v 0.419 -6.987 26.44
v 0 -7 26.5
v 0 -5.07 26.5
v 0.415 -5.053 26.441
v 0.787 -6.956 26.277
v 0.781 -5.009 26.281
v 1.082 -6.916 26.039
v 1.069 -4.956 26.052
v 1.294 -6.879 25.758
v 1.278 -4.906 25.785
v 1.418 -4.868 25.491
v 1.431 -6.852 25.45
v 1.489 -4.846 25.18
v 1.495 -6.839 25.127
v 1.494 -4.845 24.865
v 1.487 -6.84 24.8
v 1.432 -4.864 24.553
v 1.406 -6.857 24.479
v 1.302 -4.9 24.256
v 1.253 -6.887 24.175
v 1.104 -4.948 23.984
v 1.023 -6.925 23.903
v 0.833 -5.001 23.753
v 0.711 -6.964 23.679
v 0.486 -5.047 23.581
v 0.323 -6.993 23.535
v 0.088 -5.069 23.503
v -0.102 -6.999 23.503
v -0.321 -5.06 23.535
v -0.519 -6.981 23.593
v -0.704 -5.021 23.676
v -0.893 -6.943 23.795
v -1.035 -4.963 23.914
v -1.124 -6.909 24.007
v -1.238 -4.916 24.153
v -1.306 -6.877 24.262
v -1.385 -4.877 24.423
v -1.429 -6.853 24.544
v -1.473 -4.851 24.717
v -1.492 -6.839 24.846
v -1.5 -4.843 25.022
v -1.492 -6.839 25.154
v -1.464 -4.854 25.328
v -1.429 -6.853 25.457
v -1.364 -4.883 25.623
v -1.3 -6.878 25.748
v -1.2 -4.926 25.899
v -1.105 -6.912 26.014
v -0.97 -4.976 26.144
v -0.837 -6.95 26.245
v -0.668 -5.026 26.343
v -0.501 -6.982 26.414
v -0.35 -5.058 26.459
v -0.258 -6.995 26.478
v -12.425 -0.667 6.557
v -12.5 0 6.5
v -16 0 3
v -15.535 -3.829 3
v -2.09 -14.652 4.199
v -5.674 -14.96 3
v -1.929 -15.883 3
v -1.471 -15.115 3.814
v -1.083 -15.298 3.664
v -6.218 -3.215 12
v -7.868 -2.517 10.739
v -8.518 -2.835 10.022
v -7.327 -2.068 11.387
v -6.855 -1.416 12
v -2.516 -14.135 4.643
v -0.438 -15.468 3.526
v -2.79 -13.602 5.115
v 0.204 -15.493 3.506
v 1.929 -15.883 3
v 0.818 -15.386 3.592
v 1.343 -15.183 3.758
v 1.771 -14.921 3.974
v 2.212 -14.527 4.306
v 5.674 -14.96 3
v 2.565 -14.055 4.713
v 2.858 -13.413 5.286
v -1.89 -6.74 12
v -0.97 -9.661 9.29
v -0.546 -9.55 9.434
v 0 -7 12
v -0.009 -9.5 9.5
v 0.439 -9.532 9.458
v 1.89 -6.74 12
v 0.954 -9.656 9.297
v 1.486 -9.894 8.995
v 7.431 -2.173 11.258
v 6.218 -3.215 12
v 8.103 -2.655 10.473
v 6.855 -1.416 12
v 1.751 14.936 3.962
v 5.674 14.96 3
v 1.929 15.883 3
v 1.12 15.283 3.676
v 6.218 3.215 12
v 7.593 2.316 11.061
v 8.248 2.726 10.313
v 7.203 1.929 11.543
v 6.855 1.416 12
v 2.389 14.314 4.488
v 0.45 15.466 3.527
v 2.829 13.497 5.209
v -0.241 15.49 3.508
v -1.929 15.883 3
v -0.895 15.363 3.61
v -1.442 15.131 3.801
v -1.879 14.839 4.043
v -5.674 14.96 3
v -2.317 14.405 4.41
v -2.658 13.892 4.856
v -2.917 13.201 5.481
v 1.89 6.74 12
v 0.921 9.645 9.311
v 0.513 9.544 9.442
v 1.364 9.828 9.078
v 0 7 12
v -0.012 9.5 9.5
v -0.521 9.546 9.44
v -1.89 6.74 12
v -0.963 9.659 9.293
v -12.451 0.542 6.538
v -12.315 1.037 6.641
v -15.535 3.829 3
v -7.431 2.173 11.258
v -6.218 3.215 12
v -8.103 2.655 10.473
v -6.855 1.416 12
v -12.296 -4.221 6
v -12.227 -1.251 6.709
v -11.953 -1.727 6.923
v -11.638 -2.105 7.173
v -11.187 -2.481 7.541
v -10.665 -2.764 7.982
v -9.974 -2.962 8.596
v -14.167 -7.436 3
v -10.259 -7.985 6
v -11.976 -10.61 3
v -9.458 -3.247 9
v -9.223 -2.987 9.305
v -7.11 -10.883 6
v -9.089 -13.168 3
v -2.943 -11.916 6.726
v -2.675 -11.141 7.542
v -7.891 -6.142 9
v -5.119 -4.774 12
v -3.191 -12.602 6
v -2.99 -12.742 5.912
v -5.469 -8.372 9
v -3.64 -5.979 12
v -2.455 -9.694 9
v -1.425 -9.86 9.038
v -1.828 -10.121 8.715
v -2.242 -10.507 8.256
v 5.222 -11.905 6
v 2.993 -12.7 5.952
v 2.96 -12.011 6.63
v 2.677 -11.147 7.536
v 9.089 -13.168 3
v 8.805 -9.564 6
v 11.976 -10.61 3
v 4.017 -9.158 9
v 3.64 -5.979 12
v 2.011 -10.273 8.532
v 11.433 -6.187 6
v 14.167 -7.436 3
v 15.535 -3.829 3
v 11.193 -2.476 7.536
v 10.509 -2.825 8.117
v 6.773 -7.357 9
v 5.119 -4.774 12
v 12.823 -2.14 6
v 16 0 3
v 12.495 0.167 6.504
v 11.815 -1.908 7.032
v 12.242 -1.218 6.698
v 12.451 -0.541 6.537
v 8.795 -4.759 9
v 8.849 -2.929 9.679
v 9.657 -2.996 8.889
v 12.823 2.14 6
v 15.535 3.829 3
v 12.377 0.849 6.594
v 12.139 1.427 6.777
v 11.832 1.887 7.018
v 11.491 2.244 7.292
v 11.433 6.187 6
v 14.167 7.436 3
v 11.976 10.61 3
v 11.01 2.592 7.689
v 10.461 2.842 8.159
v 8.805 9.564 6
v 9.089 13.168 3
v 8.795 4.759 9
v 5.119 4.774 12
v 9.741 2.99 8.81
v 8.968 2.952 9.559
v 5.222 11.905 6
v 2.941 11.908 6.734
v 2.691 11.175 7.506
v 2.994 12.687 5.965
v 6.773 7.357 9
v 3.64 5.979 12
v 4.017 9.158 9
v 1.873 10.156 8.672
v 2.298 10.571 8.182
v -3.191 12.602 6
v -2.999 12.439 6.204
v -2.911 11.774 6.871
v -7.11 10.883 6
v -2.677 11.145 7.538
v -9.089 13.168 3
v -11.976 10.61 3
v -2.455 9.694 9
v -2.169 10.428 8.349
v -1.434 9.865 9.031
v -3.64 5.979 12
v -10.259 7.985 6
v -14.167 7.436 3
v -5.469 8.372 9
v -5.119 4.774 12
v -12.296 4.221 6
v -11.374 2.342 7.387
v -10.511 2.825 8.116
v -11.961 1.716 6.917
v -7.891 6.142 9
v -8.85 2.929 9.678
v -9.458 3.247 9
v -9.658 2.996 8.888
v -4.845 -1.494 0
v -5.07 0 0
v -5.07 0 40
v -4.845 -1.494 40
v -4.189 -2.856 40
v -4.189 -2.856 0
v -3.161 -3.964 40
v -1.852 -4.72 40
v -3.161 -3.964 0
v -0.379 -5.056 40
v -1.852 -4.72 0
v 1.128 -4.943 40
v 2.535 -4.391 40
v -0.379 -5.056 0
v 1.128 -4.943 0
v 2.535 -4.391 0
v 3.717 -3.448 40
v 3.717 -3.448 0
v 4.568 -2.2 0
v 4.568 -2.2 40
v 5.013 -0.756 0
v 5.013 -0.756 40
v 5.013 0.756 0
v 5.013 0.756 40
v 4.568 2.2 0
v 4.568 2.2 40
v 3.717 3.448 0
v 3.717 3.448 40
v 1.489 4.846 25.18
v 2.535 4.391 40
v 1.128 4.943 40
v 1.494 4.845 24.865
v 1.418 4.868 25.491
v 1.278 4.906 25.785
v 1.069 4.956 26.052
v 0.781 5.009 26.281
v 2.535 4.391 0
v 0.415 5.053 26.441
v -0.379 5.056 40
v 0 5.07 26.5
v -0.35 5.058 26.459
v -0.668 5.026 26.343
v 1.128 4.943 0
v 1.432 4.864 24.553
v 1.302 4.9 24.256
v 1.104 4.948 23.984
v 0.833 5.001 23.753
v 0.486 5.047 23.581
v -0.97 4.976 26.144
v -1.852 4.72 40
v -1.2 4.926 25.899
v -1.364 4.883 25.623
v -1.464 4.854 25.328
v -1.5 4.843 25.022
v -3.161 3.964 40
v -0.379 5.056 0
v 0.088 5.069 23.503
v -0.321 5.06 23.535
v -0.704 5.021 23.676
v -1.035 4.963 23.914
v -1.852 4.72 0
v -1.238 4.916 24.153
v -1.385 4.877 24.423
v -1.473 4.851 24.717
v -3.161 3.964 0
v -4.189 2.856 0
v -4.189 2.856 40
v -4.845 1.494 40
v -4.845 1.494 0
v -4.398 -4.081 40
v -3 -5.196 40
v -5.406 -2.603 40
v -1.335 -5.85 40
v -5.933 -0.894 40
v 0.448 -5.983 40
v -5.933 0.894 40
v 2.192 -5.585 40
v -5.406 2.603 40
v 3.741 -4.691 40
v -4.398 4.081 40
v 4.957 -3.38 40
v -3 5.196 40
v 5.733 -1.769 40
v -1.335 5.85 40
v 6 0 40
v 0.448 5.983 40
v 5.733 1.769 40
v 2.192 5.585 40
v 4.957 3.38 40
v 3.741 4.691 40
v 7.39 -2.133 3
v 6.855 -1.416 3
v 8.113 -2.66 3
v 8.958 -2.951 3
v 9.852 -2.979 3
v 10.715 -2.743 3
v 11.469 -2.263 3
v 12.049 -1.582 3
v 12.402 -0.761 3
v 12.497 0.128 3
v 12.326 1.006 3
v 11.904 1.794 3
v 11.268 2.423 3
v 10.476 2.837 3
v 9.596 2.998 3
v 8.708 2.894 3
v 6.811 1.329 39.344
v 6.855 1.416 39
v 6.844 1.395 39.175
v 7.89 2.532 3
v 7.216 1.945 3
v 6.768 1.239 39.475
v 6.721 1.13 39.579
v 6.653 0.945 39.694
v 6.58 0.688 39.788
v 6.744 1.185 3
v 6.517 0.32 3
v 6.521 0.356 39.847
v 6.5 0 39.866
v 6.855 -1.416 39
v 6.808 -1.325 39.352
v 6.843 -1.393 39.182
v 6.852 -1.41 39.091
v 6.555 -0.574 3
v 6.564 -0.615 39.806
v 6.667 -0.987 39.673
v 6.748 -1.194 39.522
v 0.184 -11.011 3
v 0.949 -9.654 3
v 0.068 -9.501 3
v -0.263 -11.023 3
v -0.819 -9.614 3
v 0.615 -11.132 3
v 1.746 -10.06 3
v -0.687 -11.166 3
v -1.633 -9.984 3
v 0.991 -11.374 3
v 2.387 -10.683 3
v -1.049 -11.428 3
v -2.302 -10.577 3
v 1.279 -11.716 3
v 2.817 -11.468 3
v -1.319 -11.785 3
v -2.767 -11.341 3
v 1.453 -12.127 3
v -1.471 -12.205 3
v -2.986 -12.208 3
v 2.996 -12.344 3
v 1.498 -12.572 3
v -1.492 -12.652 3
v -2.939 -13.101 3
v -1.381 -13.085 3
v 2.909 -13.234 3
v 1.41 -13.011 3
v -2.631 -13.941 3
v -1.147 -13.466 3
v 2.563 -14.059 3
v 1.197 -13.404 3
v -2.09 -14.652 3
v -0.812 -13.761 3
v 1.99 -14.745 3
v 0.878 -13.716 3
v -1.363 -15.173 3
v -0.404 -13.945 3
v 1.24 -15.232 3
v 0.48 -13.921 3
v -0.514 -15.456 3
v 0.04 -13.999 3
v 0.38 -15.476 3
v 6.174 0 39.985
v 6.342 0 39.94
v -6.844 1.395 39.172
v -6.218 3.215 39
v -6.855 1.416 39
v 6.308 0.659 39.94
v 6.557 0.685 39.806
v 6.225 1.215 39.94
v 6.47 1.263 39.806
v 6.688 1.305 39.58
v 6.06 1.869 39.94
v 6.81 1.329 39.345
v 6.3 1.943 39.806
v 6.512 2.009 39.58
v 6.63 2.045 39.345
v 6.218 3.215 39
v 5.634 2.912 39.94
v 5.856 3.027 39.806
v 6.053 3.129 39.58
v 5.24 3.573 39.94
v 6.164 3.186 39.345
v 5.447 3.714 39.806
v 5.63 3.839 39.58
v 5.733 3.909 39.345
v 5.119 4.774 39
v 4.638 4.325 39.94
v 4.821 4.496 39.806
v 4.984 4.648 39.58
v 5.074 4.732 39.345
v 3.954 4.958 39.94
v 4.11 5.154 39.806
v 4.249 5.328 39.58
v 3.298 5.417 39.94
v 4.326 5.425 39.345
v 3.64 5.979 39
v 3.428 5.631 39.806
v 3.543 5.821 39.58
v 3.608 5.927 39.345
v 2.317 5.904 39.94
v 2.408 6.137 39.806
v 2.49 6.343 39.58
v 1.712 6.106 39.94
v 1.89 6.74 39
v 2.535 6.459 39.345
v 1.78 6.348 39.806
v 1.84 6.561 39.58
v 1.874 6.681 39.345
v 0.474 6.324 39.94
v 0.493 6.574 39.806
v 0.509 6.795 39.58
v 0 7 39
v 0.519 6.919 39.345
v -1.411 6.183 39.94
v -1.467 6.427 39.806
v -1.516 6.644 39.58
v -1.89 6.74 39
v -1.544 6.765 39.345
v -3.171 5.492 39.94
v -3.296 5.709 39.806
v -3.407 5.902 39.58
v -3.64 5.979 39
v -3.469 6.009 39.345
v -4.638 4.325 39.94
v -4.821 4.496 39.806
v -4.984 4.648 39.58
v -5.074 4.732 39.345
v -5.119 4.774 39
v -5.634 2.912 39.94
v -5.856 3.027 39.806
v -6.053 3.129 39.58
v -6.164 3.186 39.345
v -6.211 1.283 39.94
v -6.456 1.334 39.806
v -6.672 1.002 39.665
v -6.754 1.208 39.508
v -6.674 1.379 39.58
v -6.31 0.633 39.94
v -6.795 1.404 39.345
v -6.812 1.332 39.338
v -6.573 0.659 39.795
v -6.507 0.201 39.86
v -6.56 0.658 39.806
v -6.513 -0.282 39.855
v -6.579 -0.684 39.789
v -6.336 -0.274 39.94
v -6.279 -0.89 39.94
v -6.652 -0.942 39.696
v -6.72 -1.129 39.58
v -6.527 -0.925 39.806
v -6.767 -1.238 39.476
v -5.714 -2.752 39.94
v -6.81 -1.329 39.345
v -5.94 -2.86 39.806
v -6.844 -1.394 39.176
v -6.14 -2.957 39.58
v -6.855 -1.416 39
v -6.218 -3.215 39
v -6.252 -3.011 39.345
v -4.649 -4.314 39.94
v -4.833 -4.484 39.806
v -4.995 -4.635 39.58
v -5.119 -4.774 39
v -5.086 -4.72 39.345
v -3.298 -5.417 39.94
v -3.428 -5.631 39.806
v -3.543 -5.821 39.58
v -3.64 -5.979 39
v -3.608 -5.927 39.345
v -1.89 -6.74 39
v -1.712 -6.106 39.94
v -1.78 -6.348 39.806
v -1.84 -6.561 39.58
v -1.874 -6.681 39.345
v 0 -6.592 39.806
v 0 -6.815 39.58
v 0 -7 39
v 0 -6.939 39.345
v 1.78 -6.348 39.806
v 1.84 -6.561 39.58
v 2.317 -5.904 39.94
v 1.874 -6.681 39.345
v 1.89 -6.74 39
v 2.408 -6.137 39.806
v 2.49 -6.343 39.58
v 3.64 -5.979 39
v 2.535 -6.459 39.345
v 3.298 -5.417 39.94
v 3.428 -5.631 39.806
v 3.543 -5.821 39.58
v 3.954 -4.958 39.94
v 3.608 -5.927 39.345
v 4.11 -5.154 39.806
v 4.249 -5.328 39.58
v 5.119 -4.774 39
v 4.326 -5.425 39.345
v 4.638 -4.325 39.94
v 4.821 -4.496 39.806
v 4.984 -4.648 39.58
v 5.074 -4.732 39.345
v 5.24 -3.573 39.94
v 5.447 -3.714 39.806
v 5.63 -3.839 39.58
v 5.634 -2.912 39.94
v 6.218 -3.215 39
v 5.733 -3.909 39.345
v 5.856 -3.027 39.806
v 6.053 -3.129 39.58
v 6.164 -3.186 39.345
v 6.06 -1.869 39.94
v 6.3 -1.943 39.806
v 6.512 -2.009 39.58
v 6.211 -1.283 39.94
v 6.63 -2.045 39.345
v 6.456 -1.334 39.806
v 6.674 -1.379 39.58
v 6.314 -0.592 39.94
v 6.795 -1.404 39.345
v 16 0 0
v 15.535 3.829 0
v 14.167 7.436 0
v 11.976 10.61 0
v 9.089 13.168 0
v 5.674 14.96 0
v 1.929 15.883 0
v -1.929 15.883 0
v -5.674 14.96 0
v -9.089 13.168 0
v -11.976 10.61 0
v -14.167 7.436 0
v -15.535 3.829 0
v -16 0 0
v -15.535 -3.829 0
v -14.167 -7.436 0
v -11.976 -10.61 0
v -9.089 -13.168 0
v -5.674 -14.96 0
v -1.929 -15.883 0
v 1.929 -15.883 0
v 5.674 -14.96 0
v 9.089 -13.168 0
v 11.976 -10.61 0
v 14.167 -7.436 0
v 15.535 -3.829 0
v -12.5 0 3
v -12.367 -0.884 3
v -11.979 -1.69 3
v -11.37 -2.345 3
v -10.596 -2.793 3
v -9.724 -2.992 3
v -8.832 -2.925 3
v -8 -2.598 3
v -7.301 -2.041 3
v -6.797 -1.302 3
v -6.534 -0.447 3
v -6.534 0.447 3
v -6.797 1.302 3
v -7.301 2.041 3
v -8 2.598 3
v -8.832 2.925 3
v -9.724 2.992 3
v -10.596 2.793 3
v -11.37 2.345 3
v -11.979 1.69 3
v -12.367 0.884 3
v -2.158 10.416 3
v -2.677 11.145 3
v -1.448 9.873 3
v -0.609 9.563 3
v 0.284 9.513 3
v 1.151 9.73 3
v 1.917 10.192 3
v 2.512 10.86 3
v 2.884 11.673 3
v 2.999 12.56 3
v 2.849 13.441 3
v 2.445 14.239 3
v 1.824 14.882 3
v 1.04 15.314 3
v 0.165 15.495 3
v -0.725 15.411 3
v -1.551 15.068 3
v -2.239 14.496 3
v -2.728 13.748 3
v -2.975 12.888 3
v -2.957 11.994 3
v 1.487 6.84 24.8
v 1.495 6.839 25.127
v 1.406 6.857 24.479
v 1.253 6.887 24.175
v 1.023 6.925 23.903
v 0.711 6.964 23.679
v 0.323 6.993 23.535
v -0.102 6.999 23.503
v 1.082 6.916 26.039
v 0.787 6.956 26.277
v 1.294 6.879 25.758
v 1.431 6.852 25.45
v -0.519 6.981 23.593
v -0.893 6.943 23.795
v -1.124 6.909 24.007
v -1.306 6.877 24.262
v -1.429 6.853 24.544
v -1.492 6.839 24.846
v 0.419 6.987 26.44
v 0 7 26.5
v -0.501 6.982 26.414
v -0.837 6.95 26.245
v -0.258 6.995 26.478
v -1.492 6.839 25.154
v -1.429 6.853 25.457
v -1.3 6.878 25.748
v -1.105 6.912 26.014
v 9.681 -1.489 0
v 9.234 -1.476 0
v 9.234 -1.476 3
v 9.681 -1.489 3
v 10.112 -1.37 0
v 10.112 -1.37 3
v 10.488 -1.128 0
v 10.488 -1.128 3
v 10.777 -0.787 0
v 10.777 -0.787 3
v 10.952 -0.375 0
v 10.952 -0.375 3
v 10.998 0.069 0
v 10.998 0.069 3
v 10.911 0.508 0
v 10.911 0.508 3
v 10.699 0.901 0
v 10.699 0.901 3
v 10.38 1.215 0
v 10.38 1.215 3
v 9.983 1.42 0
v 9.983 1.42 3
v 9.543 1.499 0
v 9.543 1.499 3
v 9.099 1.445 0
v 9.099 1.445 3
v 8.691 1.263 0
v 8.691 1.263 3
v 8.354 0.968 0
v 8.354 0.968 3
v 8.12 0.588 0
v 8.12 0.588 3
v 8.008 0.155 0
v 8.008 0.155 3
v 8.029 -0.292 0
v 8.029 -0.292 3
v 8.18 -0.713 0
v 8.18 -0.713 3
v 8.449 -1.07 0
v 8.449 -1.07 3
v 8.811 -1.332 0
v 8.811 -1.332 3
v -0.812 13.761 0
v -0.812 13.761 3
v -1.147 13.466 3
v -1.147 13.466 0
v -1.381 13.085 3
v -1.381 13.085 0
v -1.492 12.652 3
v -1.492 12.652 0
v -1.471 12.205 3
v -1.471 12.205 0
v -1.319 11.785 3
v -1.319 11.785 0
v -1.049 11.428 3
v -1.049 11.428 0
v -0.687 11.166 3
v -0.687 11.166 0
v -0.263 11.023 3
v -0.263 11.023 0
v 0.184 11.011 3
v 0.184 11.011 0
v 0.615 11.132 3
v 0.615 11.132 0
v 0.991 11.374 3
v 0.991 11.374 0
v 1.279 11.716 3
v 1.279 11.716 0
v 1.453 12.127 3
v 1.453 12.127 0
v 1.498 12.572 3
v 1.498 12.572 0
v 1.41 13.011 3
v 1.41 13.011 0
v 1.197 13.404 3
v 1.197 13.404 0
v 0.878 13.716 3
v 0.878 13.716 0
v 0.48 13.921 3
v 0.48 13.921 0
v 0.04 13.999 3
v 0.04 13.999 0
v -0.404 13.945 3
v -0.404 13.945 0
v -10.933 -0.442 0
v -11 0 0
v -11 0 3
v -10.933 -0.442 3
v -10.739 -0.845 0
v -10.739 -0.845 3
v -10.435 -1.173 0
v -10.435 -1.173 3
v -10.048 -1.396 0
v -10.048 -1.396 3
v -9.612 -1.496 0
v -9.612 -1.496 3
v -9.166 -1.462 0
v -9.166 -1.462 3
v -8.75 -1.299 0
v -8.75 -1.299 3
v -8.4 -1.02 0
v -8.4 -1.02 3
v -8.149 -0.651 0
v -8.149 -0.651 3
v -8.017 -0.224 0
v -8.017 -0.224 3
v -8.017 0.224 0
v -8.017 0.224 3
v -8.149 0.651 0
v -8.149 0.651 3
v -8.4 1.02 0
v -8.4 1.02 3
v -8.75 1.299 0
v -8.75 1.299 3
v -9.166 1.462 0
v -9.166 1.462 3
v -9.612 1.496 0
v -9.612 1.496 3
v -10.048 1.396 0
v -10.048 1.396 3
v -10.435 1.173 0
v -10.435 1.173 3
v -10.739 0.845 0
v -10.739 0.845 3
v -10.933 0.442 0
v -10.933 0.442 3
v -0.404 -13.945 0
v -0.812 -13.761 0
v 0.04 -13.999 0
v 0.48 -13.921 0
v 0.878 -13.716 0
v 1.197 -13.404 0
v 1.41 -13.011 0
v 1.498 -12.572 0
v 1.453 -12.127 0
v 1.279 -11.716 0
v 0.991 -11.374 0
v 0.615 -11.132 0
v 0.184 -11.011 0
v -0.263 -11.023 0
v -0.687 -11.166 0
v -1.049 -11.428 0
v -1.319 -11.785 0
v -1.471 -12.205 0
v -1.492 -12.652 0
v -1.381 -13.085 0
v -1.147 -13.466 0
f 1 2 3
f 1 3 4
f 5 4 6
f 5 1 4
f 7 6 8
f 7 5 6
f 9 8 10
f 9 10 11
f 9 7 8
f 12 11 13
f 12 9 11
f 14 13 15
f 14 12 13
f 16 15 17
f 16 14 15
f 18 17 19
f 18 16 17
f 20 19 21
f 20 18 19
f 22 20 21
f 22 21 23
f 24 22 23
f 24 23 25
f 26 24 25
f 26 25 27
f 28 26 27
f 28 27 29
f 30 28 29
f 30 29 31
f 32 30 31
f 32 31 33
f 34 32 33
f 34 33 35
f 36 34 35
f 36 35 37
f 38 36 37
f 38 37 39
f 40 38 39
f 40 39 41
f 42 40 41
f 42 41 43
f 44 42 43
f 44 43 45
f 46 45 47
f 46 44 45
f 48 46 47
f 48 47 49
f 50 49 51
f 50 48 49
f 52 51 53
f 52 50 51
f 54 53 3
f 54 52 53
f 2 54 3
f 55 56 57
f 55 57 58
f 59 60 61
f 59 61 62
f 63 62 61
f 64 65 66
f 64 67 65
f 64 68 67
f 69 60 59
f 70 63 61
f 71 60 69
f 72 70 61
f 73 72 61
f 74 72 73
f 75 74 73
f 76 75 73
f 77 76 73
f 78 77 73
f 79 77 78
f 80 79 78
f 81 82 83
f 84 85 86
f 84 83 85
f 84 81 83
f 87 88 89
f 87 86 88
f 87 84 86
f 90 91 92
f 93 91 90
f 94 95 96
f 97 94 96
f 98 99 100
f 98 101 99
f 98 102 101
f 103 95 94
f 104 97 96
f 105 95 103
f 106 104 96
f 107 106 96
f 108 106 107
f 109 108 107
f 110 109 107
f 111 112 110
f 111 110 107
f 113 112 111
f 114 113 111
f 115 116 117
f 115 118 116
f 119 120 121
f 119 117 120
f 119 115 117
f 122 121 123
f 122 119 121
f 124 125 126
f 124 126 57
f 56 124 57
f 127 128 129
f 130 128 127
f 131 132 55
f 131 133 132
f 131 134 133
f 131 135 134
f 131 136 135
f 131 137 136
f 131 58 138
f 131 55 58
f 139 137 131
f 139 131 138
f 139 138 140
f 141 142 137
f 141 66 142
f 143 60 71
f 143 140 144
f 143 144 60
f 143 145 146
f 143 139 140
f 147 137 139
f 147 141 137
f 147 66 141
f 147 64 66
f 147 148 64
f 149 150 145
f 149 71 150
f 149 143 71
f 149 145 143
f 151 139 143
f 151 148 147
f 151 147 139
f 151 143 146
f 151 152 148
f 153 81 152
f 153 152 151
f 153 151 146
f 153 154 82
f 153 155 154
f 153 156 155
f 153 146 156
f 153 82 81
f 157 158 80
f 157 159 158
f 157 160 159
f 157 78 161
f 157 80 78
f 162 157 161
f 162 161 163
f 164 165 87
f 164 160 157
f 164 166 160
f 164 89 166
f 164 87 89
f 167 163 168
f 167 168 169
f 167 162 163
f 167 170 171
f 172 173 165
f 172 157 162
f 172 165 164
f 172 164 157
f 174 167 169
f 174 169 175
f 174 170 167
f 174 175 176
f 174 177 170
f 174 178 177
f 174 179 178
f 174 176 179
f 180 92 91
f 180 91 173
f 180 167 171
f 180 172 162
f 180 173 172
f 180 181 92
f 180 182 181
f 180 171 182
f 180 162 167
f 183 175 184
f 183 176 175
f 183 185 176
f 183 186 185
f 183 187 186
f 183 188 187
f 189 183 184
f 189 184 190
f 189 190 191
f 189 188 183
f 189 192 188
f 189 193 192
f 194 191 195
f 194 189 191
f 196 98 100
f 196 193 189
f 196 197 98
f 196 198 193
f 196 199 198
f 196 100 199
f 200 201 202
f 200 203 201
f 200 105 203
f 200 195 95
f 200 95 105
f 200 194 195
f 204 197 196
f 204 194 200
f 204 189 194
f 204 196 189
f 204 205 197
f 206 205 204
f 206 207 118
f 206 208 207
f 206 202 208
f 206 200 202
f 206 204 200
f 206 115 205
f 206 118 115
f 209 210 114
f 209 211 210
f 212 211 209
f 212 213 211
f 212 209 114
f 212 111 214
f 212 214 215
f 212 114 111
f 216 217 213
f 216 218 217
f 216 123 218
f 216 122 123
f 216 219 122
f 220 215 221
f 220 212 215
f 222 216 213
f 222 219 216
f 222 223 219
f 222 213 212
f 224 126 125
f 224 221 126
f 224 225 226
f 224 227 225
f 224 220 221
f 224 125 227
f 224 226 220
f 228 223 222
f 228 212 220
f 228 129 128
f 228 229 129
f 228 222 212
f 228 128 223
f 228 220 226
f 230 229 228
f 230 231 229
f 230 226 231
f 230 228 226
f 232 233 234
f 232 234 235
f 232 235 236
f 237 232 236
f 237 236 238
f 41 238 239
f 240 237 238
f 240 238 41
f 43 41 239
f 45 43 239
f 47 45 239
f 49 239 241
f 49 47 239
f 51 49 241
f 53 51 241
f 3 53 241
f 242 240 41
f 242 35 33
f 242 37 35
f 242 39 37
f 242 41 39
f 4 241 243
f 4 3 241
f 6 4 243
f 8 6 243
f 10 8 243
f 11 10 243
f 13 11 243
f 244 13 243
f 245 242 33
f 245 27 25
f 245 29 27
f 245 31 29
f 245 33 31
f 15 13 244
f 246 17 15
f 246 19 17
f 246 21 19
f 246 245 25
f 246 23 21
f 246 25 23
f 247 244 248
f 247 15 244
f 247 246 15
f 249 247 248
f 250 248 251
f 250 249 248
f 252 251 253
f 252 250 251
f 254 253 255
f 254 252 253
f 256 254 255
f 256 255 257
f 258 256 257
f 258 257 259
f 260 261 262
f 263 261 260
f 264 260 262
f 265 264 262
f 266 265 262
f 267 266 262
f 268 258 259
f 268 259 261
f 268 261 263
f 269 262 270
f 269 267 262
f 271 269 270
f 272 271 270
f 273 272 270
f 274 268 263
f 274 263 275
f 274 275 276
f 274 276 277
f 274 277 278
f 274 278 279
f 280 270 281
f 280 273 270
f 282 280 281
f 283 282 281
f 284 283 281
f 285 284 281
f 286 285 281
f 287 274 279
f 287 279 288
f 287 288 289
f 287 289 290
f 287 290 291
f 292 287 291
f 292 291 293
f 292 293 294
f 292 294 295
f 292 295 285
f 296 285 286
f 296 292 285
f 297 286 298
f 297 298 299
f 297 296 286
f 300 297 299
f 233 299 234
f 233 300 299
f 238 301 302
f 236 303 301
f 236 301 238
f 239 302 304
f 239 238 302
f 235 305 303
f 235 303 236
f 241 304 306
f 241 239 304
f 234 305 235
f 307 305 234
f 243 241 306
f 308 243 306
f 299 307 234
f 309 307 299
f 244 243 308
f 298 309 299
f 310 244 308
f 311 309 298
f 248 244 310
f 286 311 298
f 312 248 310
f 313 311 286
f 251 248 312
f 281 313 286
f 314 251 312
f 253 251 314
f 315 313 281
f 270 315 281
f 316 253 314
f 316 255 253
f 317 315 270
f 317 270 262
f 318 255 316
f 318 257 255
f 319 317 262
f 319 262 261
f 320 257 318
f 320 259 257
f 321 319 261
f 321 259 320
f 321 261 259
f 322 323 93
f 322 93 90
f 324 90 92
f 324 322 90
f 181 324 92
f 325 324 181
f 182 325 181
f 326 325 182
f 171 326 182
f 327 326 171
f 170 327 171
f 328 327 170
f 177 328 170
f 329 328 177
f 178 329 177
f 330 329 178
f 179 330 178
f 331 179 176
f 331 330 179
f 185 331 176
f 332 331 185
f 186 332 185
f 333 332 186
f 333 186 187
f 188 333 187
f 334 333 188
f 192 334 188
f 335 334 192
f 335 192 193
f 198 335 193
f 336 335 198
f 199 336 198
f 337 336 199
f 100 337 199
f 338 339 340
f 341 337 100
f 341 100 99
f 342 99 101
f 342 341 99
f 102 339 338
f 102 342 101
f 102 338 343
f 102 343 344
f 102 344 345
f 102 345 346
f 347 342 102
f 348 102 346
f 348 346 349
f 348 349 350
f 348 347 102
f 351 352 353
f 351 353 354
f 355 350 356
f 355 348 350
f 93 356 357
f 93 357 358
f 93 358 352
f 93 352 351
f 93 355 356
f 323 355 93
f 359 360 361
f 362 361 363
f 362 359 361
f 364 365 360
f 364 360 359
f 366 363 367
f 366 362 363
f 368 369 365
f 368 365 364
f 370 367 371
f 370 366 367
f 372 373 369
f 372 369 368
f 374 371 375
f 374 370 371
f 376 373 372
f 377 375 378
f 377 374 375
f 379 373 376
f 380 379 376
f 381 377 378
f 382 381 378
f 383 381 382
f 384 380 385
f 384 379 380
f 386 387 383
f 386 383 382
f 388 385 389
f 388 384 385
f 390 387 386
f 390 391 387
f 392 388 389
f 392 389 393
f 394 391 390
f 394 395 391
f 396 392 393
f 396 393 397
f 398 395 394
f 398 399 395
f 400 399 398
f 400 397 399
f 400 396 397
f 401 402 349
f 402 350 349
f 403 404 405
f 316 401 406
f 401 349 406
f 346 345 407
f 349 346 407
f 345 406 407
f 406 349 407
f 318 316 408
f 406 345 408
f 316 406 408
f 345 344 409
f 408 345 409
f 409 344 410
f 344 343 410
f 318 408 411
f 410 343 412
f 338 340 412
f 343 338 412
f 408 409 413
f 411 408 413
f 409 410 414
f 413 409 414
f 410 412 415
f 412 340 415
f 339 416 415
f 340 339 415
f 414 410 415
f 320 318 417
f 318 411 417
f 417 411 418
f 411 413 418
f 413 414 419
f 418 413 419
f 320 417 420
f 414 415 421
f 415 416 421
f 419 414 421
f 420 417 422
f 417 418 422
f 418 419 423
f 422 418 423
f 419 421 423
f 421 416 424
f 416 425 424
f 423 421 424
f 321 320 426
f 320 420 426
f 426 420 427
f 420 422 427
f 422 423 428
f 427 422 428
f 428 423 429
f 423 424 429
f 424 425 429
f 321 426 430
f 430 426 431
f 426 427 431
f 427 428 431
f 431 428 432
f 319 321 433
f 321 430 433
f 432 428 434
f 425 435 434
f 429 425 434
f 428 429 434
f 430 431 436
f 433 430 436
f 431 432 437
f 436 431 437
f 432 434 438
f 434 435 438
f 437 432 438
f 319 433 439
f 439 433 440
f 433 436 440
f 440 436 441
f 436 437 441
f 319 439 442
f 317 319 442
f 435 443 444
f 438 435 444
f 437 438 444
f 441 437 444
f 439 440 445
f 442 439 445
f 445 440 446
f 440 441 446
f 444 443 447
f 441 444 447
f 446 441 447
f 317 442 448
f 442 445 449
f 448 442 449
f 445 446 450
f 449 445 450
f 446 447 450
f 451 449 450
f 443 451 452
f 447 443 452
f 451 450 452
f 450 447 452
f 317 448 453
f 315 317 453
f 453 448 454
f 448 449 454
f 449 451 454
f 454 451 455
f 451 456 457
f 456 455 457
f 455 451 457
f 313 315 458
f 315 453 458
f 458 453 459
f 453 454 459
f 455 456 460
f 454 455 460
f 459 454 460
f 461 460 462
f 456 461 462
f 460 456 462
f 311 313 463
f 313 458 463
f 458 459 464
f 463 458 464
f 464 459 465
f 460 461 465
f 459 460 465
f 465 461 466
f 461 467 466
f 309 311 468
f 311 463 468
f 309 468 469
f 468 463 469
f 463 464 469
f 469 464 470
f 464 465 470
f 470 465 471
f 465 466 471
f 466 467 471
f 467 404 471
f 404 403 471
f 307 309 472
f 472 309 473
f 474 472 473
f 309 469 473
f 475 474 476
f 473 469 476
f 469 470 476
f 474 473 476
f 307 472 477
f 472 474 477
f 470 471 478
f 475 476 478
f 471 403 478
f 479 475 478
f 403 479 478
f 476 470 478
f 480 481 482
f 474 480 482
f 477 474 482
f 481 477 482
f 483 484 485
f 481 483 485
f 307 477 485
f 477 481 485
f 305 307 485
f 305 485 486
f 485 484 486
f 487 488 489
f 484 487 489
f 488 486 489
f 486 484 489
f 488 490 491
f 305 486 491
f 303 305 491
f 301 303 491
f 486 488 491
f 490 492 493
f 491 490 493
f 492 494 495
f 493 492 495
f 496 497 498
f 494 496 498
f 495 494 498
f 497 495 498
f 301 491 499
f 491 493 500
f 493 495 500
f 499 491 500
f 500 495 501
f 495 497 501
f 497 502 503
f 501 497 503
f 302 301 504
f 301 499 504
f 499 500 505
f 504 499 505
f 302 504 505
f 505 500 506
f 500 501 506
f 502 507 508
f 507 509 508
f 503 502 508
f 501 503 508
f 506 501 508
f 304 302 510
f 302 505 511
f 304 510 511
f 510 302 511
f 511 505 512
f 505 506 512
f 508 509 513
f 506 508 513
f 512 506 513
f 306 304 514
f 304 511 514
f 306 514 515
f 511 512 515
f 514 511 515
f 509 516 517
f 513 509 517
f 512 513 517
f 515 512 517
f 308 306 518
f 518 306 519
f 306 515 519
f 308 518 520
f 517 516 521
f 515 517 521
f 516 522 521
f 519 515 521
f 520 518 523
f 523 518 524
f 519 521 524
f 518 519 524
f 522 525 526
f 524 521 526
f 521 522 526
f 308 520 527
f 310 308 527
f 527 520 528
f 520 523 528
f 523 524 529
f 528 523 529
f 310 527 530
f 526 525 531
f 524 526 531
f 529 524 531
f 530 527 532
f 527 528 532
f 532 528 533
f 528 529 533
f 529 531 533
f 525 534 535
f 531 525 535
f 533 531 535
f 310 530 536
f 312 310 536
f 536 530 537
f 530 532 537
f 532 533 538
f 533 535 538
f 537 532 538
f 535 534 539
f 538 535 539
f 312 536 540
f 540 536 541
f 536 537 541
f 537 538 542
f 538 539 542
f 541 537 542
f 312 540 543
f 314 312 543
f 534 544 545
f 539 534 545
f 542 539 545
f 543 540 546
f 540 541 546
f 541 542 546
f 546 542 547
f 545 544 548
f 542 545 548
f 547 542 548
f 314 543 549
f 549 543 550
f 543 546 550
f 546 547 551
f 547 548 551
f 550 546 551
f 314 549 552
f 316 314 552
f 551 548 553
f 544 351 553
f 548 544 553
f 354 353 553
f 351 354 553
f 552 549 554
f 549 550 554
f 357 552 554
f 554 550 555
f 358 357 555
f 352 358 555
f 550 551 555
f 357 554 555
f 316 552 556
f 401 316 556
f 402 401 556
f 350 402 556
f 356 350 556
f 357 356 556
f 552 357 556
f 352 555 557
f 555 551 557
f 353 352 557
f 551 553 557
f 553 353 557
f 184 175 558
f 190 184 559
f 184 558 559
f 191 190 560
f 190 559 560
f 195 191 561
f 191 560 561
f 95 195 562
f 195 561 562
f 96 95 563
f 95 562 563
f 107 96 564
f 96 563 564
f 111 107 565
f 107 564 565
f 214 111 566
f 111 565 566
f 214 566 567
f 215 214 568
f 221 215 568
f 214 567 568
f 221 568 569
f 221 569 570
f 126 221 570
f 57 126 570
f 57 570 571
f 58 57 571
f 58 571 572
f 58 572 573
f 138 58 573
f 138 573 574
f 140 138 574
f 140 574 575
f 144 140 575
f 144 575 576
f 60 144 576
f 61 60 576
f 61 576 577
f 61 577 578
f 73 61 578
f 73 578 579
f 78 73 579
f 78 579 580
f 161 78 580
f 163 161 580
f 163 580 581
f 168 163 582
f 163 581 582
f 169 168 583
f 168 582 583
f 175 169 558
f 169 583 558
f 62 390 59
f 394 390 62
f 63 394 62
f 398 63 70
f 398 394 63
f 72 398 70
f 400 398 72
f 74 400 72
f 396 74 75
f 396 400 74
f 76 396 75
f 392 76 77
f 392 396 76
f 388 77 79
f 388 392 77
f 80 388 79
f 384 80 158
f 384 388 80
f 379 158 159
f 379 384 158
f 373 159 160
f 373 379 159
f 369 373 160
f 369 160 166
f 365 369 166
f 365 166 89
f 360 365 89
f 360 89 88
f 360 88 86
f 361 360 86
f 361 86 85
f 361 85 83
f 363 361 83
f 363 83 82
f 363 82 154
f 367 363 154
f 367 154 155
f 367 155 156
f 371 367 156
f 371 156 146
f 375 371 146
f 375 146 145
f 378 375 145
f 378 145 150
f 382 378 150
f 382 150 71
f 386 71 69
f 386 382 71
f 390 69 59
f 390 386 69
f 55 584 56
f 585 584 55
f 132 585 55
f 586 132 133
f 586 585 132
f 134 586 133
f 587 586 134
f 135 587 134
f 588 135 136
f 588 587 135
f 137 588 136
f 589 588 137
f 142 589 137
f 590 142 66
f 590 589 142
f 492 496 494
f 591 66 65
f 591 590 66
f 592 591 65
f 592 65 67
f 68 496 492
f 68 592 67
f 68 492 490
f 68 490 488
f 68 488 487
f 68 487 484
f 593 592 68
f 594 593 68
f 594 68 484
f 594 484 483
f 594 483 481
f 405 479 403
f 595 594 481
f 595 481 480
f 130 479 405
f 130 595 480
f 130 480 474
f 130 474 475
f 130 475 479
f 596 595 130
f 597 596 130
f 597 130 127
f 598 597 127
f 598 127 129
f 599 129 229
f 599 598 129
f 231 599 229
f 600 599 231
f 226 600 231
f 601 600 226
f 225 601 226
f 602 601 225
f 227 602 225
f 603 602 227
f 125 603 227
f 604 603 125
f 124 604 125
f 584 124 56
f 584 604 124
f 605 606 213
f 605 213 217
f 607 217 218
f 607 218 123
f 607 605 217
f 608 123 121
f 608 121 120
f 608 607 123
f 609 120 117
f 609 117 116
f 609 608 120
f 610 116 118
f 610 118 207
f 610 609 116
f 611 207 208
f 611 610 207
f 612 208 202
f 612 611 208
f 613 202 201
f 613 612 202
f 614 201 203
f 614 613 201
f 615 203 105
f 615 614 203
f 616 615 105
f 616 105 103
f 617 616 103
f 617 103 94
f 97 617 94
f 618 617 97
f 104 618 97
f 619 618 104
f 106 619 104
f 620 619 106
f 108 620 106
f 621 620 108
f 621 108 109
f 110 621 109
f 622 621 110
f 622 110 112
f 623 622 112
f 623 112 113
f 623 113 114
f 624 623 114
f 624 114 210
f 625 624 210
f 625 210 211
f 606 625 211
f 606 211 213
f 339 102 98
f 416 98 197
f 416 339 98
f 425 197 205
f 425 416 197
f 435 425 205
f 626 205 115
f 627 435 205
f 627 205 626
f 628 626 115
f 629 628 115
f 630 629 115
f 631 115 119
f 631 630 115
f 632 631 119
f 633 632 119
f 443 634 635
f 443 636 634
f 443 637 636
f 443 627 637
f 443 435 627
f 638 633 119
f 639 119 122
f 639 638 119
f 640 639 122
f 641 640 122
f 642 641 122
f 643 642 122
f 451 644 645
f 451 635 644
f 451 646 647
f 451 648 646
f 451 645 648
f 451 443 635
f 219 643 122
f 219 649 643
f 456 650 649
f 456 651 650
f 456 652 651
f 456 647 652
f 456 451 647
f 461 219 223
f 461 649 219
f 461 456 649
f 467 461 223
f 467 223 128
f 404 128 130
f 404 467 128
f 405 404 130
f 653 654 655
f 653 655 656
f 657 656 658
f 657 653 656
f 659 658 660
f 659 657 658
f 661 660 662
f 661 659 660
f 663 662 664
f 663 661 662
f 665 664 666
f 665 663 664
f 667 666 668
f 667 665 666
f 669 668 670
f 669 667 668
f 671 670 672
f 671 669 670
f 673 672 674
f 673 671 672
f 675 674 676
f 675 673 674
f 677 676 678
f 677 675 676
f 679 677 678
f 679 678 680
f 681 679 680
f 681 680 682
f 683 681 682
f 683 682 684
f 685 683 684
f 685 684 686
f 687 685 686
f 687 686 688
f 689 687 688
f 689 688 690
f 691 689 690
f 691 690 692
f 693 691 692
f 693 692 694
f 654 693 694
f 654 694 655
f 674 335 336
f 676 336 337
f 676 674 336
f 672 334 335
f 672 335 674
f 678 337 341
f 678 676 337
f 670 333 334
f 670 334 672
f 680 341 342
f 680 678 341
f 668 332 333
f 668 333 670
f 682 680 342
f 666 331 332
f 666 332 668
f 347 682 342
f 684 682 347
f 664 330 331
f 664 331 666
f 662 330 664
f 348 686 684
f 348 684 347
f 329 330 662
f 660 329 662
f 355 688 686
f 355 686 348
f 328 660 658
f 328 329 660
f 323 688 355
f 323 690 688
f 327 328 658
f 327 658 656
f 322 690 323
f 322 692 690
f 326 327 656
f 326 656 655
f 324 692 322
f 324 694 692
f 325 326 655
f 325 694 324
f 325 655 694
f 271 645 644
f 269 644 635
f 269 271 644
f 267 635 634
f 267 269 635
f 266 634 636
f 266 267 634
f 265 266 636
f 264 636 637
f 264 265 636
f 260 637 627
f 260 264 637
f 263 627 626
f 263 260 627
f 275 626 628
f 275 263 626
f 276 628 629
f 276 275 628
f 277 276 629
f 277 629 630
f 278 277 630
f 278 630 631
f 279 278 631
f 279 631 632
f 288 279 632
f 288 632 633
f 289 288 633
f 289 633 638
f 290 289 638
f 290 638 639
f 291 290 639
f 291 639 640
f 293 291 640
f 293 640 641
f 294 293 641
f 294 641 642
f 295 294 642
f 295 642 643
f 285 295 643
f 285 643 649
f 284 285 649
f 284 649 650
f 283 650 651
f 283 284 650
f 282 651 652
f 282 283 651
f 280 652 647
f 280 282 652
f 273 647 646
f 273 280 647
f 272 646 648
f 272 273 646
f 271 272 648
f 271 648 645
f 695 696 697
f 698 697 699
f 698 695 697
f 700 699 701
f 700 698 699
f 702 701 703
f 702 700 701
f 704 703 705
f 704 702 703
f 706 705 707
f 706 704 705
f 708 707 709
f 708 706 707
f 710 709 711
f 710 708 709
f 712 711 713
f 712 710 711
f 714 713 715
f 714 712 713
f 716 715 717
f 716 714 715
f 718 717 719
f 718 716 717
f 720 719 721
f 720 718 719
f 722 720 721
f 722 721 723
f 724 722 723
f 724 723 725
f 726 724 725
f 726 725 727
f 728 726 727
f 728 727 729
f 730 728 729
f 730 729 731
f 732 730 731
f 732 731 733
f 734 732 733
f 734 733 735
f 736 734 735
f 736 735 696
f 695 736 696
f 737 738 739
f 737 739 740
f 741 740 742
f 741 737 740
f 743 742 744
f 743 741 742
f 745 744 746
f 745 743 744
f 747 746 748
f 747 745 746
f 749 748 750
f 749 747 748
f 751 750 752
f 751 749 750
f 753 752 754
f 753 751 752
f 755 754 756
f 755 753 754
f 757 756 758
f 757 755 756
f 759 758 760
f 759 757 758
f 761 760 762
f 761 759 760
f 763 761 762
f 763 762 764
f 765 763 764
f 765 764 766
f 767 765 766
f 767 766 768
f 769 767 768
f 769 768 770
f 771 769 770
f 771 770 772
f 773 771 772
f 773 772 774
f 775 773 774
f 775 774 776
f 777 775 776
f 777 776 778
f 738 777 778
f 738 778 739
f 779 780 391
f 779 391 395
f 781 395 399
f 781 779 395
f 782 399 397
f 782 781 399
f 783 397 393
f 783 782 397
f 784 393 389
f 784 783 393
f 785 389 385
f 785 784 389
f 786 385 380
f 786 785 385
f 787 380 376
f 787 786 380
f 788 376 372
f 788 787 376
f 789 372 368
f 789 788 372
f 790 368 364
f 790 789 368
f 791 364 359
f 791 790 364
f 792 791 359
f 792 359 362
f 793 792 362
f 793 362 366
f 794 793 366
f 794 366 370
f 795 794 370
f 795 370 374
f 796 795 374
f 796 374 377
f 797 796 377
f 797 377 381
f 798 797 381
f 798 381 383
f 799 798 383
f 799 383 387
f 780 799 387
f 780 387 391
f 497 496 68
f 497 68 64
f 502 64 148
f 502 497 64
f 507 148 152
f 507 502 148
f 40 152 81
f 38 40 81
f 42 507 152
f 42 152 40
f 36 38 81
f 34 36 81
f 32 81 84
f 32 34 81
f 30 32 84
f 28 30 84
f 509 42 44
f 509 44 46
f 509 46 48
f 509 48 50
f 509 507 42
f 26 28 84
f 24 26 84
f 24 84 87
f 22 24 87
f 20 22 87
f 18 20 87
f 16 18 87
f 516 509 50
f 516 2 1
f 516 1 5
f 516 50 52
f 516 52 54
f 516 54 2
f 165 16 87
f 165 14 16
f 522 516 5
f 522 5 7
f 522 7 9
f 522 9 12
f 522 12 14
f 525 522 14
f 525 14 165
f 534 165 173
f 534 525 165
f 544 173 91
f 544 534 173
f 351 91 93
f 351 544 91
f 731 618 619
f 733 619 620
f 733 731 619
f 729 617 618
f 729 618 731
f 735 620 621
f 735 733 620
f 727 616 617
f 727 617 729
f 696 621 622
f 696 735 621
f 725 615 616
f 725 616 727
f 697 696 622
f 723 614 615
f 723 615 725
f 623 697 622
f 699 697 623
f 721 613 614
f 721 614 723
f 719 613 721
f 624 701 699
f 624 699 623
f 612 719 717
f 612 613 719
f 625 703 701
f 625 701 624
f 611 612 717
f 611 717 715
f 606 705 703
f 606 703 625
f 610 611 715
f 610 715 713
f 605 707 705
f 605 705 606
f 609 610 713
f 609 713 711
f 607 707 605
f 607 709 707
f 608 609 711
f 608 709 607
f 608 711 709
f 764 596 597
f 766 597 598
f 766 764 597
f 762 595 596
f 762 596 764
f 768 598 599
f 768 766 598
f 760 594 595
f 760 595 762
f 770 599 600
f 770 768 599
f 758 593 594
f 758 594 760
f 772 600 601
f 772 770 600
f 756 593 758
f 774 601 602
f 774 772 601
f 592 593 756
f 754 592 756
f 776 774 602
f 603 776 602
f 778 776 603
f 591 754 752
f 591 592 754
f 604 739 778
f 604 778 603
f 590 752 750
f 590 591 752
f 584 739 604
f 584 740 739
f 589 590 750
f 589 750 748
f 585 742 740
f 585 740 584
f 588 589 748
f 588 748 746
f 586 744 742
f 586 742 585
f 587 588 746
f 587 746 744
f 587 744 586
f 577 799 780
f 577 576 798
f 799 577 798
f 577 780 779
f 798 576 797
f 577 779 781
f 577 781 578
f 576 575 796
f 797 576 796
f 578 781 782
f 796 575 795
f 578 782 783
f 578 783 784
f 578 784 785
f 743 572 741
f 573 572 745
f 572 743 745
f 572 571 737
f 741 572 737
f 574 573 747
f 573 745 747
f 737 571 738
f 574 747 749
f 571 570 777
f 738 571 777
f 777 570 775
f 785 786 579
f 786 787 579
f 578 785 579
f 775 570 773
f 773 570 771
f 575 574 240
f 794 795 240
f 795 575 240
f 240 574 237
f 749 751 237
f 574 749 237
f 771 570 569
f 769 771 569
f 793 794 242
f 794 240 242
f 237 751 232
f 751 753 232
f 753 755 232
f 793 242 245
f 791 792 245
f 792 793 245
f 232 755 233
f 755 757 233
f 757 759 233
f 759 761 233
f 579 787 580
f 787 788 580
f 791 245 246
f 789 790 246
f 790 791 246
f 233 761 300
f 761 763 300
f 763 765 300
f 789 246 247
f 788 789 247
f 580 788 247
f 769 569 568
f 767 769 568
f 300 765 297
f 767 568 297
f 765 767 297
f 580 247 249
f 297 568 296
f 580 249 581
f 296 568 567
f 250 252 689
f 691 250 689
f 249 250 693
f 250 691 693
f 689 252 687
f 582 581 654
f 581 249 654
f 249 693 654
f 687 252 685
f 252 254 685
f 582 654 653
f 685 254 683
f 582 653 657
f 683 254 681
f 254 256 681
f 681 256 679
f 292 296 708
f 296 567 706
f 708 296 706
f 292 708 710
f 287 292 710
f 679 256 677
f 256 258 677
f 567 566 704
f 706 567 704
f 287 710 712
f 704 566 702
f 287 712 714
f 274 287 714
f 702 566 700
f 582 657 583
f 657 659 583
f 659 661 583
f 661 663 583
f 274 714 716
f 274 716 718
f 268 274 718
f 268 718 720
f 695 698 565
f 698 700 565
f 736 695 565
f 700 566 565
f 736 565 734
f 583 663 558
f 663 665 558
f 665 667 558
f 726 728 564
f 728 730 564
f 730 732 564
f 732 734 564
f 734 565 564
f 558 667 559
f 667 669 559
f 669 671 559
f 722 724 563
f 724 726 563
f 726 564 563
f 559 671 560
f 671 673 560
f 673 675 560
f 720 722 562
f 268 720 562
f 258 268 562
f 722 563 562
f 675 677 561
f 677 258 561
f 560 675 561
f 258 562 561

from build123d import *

# Parameters (mm, degrees)
SKETCH_1_R               = 16
EXTRUDE_1_DEPTH          = 40
SKETCH_2_W               = 5.07
SKETCH_2_H               = 40
SKETCH_3_R               = 1.5
CUT_EXTRUDE_2_DEPTH      = 46.956501172
SKETCH_4_R               = 3
SKETCH_4_R_2             = 1.5
CUT_EXTRUDE_3_DEPTH      = 44.370496958
CUT_EXTRUDE_4_DEPTH      = 46.956501329
CUT_EXTRUDE_4_DEPTH_BACK = 46.956501329
SKETCH_5_R               = 1.5


with BuildPart() as part:
    # 草图1 → 凸台-拉伸1 (new body)
    with BuildSketch(Plane.XY):
        Circle(SKETCH_1_R)
    extrude(amount=EXTRUDE_1_DEPTH)

    # 草图2 → 切除-旋转1 (revolve, cut)
    with BuildSketch(Plane(origin=(0, 0, 0), x_dir=(1, 0, 0), z_dir=(0, 1, 0))):
        Polygon((-16, -40), (-16, -3), (-7, -12), (-7, -40), align=None)
        with Locations((-2.535, -20)):
            Rectangle(SKETCH_2_W, SKETCH_2_H)
    revolve(axis=Axis((0, 0, 0), (0, 0, 1)), mode=Mode.SUBTRACT)

    # 草图3 → 切除-拉伸2 (cut, through all)
    with BuildSketch(Plane.XY):
        with Locations(Location((0, -12.5, 0), (0, 0, 237.240983175))):
            Circle(SKETCH_3_R)
        with Locations(Location((-9.5, 0, 0), (0, 0, 179.999999805))):
            Circle(SKETCH_3_R)
        with Locations(Location((9.5, 0, 0), (0, 0, 259.790179824))):
            Circle(SKETCH_3_R)
        with Locations(Location((0, 12.5, 0), (0, 0, 122.759016825))):
            Circle(SKETCH_3_R)
    extrude(amount=CUT_EXTRUDE_2_DEPTH, mode=Mode.SUBTRACT)

    # 草图4 → 切除-拉伸3 (cut, through all)
    # profile 1 of 4: a face of its own
    with BuildSketch(Plane.XY.offset(3)):
        with Locations(Location((0, 12.5, 0), (0, 0, 206.851583032))):
            Circle(SKETCH_4_R)
        with Locations((0, 12.5)):
            Circle(SKETCH_4_R_2, mode=Mode.SUBTRACT)
    # profile 2 of 4: a face of its own
    with BuildSketch(Plane.XY.offset(3)):
        with Locations(Location((-9.5, 0, 0), (0, 0, 179.999999996))):
            Circle(SKETCH_4_R)
        with Locations((-9.5, 0)):
            Circle(SKETCH_4_R_2, mode=Mode.SUBTRACT)
    # profile 3 of 4: a face of its own
    with BuildSketch(Plane.XY.offset(3)):
        with Locations(Location((9.5, 0, 0), (0, 0, 208.166578237))):
            Circle(SKETCH_4_R)
        with Locations((9.5, 0)):
            Circle(SKETCH_4_R_2, mode=Mode.SUBTRACT)
    # profile 4 of 4: a face of its own
    with BuildSketch(Plane.XY.offset(3)):
        with Locations(Location((0, -12.5, 0), (0, 0, 225.843438768))):
            Circle(SKETCH_4_R)
        with Locations((0, -12.5)):
            Circle(SKETCH_4_R_2, mode=Mode.SUBTRACT)
    extrude(amount=CUT_EXTRUDE_3_DEPTH, mode=Mode.SUBTRACT)

    # 草图5 → 切除-拉伸4 (cut, two sides: drawn at the far end of the back side and taken through both)
    with BuildSketch(Plane(origin=(0, 0, 0), x_dir=(1, 0, 0), z_dir=(0, 1, 0)).offset(-CUT_EXTRUDE_4_DEPTH_BACK)):
        with Locations(Location((0, -25, 0), (0, 0, 270))):
            Circle(SKETCH_5_R)
    extrude(amount=CUT_EXTRUDE_4_DEPTH + CUT_EXTRUDE_4_DEPTH_BACK, mode=Mode.SUBTRACT)

    # 圆角1: read off the stored shape, not the designer's step
    # 圆角1 outline → 圆角1 (revolve, cut)
    with BuildSketch(Plane.XZ):
        with BuildLine():
            ThreePointArc((6, 40), (6.707106781, 39.707106781), (7, 39))
            Line((7, 39), (7, 40))
            Line((7, 40), (6, 40))
        make_face()
    revolve(axis=Axis((0, 0, 0), (0, 0, 1)), mode=Mode.SUBTRACT)


solid = part.part
